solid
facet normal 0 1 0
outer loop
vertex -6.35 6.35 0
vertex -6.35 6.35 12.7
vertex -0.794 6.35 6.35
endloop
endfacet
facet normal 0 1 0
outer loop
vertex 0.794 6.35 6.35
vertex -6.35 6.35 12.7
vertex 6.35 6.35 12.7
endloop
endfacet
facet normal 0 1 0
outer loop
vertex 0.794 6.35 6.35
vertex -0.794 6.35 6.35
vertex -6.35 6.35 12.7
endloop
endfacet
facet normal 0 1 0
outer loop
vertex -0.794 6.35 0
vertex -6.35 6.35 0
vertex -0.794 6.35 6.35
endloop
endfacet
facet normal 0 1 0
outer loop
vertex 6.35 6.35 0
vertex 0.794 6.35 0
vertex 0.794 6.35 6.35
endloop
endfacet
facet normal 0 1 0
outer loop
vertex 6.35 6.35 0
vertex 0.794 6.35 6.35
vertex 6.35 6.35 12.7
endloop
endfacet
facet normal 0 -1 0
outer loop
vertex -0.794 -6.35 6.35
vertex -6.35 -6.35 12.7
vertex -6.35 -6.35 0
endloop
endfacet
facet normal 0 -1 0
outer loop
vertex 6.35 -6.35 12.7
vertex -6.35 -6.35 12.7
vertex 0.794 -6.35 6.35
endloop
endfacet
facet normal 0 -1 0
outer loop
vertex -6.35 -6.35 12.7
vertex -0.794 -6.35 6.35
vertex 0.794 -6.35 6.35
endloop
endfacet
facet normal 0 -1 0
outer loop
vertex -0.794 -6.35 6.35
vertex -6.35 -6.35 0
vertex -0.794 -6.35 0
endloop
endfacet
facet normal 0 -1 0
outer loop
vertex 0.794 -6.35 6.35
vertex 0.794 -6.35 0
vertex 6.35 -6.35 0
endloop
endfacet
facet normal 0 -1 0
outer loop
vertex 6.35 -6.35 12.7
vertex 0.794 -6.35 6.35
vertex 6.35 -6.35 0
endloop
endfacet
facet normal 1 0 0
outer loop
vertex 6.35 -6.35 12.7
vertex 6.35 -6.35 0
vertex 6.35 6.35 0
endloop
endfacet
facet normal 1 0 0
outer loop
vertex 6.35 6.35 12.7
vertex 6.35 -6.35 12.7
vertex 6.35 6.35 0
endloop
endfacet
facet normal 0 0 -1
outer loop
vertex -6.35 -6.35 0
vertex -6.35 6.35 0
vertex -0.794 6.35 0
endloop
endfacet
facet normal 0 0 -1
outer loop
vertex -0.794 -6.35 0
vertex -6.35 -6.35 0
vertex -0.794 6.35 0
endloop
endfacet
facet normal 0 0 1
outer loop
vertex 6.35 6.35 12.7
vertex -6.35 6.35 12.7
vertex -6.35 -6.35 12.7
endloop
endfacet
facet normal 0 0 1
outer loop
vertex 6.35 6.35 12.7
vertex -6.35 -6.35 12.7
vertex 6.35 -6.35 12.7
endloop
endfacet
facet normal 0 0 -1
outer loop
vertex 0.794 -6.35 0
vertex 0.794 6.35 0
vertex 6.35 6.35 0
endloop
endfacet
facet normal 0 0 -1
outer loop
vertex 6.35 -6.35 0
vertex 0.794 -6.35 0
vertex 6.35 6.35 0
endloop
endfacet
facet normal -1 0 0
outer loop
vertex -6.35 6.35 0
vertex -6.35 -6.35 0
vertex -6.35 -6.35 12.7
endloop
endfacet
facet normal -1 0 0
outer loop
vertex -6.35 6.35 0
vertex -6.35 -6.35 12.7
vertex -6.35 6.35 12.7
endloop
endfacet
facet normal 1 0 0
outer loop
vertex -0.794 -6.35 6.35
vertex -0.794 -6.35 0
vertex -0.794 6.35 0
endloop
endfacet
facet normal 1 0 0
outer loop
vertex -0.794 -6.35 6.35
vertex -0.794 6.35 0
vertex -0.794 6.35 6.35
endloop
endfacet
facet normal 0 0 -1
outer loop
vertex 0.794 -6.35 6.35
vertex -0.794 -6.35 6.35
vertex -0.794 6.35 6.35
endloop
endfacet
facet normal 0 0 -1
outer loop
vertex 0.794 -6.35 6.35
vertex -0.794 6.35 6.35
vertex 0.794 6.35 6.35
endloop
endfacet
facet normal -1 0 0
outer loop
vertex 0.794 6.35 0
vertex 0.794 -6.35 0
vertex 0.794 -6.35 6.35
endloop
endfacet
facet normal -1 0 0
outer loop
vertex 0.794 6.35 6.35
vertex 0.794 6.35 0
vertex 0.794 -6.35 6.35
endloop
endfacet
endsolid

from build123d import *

# Parameters (mm, degrees)
F0_W     = 12.7
F0_H     = 12.7
F1_DEPTH = 12.7
F2_W     = 1.5875
F2_H     = 6.35
F3_DEPTH = 12.7


with BuildPart() as f1:
    # F0 (on Top) → F1 (new body)
    with BuildSketch(Plane.XY):
        Rectangle(F0_W, F0_H)
    extrude(amount=F1_DEPTH)

    # F2 (on face) → F3 (cut, through all)
    with BuildSketch(Plane.XZ.offset(6.35)):
        with Locations((0, 3.175)):
            Rectangle(F2_W, F2_H)
    extrude(amount=-F3_DEPTH, mode=Mode.SUBTRACT)


solid = f1.part
